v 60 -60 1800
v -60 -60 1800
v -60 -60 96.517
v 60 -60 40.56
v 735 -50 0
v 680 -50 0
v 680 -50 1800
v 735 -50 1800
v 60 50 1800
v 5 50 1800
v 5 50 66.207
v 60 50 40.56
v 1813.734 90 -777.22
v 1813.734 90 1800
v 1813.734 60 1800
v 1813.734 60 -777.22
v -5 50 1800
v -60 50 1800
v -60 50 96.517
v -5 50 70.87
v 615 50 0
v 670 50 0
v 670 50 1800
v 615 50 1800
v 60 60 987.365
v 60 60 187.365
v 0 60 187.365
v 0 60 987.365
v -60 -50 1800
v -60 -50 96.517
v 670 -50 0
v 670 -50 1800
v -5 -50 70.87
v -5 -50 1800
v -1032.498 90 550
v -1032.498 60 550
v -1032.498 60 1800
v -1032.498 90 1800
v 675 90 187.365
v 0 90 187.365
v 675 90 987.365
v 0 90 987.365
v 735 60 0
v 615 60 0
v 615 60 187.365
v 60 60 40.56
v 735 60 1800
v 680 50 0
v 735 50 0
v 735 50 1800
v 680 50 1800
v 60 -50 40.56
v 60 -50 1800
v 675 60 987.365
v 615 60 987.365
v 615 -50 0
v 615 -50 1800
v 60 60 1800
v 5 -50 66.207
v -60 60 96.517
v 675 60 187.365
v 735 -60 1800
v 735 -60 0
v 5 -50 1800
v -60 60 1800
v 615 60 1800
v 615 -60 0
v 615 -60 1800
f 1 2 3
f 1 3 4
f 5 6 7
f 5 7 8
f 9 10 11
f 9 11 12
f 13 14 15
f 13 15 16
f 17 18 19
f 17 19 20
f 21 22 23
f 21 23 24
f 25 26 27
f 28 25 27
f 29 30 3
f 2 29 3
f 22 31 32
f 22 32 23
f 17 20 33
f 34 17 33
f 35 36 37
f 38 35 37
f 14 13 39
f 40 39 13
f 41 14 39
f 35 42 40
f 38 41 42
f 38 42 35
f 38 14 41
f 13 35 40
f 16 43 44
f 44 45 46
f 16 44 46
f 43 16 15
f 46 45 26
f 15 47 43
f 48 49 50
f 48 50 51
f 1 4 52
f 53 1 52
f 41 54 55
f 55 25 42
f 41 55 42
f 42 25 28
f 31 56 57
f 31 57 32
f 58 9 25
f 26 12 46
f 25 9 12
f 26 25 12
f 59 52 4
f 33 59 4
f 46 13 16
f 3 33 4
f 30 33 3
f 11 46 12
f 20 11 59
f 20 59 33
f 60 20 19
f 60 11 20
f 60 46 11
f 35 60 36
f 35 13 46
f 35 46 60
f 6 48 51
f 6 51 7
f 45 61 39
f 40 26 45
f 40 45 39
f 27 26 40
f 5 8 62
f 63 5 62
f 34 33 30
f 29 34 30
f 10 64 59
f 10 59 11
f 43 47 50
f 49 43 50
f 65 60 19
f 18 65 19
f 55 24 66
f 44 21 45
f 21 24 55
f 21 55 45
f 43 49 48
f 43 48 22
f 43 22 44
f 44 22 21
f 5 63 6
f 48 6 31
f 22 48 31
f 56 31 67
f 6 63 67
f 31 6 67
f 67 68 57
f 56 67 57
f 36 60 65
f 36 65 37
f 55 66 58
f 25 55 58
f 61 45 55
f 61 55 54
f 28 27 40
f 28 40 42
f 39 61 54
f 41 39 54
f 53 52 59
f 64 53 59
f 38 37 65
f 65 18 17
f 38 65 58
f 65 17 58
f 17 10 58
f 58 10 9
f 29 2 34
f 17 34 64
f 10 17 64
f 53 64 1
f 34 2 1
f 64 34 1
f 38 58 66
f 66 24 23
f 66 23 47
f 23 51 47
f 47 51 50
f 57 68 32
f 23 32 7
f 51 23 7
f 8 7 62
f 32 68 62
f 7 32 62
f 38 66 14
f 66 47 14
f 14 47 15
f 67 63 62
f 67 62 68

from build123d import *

# Parameters (mm, degrees)
F1_DEPTH = 1800
F4_W     = 675
F4_H     = 800
F5_DEPTH = 30
F7_DEPTH = 30
F9_DEPTH = 1003


with BuildPart() as f1:
    # F0 (on Top) → F1 (new body)
    with BuildSketch(Plane.XY):
        Polygon((-60, -60), (-5, -60), (5, -60), (60, -60), (60, -50), (5, -50), (5, 50), (60, 50), (60, 60), (5, 60), (-5, 60), (-60, 60), (-60, 50), (-5, 50), (-5, -50), (-60, -50), align=None)
    extrude(amount=F1_DEPTH)


with BuildPart() as f3_1:
    # F3: instance of F1
    add(f1.part.mirror(Plane.YZ.offset(337.5)))


with BuildPart() as f1_1:
    add(f1.part)

    add(f3_1.part)  # F5 merges F3_1
    # F4 (on face) → F5 (join)
    with BuildSketch(Plane(origin=(0, 60, 0), x_dir=(-1, 0, 0), z_dir=(0, 1, 0))):
        Polygon((0, 1800), (-675, 1800), (-1813.7336969376, 1800), (-1813.7336969376, 0), (-675, 0), (0, 0), (1032.4980020523, 0), (1032.4980020523, 1800), align=None)
        with Locations((-337.5, 587.3650103807)):
            Rectangle(F4_W, F4_H, mode=Mode.SUBTRACT)
    extrude(amount=F5_DEPTH)

    # F6 (on face) → F7 (join)
    with BuildSketch(Plane(origin=(0, 90, 0), x_dir=(-1, 0, 0), z_dir=(0, 1, 0))):
        Polygon((-1813.7336969376, -777.2196381225), (-146.980804228, 0), (-1813.7336969376, 0), align=None)
    extrude(amount=-F7_DEPTH)

    # F8 (on face) → F9 (cut)
    with BuildSketch(Plane(origin=(0, 90, 0), x_dir=(-1, 0, 0), z_dir=(0, 1, 0))):
        Polygon((1032.4980020523, 550), (-146.980804228, 0), (1032.4980020523, 0), align=None)
    extrude(amount=-F9_DEPTH, mode=Mode.SUBTRACT)


solid = f1_1.part
